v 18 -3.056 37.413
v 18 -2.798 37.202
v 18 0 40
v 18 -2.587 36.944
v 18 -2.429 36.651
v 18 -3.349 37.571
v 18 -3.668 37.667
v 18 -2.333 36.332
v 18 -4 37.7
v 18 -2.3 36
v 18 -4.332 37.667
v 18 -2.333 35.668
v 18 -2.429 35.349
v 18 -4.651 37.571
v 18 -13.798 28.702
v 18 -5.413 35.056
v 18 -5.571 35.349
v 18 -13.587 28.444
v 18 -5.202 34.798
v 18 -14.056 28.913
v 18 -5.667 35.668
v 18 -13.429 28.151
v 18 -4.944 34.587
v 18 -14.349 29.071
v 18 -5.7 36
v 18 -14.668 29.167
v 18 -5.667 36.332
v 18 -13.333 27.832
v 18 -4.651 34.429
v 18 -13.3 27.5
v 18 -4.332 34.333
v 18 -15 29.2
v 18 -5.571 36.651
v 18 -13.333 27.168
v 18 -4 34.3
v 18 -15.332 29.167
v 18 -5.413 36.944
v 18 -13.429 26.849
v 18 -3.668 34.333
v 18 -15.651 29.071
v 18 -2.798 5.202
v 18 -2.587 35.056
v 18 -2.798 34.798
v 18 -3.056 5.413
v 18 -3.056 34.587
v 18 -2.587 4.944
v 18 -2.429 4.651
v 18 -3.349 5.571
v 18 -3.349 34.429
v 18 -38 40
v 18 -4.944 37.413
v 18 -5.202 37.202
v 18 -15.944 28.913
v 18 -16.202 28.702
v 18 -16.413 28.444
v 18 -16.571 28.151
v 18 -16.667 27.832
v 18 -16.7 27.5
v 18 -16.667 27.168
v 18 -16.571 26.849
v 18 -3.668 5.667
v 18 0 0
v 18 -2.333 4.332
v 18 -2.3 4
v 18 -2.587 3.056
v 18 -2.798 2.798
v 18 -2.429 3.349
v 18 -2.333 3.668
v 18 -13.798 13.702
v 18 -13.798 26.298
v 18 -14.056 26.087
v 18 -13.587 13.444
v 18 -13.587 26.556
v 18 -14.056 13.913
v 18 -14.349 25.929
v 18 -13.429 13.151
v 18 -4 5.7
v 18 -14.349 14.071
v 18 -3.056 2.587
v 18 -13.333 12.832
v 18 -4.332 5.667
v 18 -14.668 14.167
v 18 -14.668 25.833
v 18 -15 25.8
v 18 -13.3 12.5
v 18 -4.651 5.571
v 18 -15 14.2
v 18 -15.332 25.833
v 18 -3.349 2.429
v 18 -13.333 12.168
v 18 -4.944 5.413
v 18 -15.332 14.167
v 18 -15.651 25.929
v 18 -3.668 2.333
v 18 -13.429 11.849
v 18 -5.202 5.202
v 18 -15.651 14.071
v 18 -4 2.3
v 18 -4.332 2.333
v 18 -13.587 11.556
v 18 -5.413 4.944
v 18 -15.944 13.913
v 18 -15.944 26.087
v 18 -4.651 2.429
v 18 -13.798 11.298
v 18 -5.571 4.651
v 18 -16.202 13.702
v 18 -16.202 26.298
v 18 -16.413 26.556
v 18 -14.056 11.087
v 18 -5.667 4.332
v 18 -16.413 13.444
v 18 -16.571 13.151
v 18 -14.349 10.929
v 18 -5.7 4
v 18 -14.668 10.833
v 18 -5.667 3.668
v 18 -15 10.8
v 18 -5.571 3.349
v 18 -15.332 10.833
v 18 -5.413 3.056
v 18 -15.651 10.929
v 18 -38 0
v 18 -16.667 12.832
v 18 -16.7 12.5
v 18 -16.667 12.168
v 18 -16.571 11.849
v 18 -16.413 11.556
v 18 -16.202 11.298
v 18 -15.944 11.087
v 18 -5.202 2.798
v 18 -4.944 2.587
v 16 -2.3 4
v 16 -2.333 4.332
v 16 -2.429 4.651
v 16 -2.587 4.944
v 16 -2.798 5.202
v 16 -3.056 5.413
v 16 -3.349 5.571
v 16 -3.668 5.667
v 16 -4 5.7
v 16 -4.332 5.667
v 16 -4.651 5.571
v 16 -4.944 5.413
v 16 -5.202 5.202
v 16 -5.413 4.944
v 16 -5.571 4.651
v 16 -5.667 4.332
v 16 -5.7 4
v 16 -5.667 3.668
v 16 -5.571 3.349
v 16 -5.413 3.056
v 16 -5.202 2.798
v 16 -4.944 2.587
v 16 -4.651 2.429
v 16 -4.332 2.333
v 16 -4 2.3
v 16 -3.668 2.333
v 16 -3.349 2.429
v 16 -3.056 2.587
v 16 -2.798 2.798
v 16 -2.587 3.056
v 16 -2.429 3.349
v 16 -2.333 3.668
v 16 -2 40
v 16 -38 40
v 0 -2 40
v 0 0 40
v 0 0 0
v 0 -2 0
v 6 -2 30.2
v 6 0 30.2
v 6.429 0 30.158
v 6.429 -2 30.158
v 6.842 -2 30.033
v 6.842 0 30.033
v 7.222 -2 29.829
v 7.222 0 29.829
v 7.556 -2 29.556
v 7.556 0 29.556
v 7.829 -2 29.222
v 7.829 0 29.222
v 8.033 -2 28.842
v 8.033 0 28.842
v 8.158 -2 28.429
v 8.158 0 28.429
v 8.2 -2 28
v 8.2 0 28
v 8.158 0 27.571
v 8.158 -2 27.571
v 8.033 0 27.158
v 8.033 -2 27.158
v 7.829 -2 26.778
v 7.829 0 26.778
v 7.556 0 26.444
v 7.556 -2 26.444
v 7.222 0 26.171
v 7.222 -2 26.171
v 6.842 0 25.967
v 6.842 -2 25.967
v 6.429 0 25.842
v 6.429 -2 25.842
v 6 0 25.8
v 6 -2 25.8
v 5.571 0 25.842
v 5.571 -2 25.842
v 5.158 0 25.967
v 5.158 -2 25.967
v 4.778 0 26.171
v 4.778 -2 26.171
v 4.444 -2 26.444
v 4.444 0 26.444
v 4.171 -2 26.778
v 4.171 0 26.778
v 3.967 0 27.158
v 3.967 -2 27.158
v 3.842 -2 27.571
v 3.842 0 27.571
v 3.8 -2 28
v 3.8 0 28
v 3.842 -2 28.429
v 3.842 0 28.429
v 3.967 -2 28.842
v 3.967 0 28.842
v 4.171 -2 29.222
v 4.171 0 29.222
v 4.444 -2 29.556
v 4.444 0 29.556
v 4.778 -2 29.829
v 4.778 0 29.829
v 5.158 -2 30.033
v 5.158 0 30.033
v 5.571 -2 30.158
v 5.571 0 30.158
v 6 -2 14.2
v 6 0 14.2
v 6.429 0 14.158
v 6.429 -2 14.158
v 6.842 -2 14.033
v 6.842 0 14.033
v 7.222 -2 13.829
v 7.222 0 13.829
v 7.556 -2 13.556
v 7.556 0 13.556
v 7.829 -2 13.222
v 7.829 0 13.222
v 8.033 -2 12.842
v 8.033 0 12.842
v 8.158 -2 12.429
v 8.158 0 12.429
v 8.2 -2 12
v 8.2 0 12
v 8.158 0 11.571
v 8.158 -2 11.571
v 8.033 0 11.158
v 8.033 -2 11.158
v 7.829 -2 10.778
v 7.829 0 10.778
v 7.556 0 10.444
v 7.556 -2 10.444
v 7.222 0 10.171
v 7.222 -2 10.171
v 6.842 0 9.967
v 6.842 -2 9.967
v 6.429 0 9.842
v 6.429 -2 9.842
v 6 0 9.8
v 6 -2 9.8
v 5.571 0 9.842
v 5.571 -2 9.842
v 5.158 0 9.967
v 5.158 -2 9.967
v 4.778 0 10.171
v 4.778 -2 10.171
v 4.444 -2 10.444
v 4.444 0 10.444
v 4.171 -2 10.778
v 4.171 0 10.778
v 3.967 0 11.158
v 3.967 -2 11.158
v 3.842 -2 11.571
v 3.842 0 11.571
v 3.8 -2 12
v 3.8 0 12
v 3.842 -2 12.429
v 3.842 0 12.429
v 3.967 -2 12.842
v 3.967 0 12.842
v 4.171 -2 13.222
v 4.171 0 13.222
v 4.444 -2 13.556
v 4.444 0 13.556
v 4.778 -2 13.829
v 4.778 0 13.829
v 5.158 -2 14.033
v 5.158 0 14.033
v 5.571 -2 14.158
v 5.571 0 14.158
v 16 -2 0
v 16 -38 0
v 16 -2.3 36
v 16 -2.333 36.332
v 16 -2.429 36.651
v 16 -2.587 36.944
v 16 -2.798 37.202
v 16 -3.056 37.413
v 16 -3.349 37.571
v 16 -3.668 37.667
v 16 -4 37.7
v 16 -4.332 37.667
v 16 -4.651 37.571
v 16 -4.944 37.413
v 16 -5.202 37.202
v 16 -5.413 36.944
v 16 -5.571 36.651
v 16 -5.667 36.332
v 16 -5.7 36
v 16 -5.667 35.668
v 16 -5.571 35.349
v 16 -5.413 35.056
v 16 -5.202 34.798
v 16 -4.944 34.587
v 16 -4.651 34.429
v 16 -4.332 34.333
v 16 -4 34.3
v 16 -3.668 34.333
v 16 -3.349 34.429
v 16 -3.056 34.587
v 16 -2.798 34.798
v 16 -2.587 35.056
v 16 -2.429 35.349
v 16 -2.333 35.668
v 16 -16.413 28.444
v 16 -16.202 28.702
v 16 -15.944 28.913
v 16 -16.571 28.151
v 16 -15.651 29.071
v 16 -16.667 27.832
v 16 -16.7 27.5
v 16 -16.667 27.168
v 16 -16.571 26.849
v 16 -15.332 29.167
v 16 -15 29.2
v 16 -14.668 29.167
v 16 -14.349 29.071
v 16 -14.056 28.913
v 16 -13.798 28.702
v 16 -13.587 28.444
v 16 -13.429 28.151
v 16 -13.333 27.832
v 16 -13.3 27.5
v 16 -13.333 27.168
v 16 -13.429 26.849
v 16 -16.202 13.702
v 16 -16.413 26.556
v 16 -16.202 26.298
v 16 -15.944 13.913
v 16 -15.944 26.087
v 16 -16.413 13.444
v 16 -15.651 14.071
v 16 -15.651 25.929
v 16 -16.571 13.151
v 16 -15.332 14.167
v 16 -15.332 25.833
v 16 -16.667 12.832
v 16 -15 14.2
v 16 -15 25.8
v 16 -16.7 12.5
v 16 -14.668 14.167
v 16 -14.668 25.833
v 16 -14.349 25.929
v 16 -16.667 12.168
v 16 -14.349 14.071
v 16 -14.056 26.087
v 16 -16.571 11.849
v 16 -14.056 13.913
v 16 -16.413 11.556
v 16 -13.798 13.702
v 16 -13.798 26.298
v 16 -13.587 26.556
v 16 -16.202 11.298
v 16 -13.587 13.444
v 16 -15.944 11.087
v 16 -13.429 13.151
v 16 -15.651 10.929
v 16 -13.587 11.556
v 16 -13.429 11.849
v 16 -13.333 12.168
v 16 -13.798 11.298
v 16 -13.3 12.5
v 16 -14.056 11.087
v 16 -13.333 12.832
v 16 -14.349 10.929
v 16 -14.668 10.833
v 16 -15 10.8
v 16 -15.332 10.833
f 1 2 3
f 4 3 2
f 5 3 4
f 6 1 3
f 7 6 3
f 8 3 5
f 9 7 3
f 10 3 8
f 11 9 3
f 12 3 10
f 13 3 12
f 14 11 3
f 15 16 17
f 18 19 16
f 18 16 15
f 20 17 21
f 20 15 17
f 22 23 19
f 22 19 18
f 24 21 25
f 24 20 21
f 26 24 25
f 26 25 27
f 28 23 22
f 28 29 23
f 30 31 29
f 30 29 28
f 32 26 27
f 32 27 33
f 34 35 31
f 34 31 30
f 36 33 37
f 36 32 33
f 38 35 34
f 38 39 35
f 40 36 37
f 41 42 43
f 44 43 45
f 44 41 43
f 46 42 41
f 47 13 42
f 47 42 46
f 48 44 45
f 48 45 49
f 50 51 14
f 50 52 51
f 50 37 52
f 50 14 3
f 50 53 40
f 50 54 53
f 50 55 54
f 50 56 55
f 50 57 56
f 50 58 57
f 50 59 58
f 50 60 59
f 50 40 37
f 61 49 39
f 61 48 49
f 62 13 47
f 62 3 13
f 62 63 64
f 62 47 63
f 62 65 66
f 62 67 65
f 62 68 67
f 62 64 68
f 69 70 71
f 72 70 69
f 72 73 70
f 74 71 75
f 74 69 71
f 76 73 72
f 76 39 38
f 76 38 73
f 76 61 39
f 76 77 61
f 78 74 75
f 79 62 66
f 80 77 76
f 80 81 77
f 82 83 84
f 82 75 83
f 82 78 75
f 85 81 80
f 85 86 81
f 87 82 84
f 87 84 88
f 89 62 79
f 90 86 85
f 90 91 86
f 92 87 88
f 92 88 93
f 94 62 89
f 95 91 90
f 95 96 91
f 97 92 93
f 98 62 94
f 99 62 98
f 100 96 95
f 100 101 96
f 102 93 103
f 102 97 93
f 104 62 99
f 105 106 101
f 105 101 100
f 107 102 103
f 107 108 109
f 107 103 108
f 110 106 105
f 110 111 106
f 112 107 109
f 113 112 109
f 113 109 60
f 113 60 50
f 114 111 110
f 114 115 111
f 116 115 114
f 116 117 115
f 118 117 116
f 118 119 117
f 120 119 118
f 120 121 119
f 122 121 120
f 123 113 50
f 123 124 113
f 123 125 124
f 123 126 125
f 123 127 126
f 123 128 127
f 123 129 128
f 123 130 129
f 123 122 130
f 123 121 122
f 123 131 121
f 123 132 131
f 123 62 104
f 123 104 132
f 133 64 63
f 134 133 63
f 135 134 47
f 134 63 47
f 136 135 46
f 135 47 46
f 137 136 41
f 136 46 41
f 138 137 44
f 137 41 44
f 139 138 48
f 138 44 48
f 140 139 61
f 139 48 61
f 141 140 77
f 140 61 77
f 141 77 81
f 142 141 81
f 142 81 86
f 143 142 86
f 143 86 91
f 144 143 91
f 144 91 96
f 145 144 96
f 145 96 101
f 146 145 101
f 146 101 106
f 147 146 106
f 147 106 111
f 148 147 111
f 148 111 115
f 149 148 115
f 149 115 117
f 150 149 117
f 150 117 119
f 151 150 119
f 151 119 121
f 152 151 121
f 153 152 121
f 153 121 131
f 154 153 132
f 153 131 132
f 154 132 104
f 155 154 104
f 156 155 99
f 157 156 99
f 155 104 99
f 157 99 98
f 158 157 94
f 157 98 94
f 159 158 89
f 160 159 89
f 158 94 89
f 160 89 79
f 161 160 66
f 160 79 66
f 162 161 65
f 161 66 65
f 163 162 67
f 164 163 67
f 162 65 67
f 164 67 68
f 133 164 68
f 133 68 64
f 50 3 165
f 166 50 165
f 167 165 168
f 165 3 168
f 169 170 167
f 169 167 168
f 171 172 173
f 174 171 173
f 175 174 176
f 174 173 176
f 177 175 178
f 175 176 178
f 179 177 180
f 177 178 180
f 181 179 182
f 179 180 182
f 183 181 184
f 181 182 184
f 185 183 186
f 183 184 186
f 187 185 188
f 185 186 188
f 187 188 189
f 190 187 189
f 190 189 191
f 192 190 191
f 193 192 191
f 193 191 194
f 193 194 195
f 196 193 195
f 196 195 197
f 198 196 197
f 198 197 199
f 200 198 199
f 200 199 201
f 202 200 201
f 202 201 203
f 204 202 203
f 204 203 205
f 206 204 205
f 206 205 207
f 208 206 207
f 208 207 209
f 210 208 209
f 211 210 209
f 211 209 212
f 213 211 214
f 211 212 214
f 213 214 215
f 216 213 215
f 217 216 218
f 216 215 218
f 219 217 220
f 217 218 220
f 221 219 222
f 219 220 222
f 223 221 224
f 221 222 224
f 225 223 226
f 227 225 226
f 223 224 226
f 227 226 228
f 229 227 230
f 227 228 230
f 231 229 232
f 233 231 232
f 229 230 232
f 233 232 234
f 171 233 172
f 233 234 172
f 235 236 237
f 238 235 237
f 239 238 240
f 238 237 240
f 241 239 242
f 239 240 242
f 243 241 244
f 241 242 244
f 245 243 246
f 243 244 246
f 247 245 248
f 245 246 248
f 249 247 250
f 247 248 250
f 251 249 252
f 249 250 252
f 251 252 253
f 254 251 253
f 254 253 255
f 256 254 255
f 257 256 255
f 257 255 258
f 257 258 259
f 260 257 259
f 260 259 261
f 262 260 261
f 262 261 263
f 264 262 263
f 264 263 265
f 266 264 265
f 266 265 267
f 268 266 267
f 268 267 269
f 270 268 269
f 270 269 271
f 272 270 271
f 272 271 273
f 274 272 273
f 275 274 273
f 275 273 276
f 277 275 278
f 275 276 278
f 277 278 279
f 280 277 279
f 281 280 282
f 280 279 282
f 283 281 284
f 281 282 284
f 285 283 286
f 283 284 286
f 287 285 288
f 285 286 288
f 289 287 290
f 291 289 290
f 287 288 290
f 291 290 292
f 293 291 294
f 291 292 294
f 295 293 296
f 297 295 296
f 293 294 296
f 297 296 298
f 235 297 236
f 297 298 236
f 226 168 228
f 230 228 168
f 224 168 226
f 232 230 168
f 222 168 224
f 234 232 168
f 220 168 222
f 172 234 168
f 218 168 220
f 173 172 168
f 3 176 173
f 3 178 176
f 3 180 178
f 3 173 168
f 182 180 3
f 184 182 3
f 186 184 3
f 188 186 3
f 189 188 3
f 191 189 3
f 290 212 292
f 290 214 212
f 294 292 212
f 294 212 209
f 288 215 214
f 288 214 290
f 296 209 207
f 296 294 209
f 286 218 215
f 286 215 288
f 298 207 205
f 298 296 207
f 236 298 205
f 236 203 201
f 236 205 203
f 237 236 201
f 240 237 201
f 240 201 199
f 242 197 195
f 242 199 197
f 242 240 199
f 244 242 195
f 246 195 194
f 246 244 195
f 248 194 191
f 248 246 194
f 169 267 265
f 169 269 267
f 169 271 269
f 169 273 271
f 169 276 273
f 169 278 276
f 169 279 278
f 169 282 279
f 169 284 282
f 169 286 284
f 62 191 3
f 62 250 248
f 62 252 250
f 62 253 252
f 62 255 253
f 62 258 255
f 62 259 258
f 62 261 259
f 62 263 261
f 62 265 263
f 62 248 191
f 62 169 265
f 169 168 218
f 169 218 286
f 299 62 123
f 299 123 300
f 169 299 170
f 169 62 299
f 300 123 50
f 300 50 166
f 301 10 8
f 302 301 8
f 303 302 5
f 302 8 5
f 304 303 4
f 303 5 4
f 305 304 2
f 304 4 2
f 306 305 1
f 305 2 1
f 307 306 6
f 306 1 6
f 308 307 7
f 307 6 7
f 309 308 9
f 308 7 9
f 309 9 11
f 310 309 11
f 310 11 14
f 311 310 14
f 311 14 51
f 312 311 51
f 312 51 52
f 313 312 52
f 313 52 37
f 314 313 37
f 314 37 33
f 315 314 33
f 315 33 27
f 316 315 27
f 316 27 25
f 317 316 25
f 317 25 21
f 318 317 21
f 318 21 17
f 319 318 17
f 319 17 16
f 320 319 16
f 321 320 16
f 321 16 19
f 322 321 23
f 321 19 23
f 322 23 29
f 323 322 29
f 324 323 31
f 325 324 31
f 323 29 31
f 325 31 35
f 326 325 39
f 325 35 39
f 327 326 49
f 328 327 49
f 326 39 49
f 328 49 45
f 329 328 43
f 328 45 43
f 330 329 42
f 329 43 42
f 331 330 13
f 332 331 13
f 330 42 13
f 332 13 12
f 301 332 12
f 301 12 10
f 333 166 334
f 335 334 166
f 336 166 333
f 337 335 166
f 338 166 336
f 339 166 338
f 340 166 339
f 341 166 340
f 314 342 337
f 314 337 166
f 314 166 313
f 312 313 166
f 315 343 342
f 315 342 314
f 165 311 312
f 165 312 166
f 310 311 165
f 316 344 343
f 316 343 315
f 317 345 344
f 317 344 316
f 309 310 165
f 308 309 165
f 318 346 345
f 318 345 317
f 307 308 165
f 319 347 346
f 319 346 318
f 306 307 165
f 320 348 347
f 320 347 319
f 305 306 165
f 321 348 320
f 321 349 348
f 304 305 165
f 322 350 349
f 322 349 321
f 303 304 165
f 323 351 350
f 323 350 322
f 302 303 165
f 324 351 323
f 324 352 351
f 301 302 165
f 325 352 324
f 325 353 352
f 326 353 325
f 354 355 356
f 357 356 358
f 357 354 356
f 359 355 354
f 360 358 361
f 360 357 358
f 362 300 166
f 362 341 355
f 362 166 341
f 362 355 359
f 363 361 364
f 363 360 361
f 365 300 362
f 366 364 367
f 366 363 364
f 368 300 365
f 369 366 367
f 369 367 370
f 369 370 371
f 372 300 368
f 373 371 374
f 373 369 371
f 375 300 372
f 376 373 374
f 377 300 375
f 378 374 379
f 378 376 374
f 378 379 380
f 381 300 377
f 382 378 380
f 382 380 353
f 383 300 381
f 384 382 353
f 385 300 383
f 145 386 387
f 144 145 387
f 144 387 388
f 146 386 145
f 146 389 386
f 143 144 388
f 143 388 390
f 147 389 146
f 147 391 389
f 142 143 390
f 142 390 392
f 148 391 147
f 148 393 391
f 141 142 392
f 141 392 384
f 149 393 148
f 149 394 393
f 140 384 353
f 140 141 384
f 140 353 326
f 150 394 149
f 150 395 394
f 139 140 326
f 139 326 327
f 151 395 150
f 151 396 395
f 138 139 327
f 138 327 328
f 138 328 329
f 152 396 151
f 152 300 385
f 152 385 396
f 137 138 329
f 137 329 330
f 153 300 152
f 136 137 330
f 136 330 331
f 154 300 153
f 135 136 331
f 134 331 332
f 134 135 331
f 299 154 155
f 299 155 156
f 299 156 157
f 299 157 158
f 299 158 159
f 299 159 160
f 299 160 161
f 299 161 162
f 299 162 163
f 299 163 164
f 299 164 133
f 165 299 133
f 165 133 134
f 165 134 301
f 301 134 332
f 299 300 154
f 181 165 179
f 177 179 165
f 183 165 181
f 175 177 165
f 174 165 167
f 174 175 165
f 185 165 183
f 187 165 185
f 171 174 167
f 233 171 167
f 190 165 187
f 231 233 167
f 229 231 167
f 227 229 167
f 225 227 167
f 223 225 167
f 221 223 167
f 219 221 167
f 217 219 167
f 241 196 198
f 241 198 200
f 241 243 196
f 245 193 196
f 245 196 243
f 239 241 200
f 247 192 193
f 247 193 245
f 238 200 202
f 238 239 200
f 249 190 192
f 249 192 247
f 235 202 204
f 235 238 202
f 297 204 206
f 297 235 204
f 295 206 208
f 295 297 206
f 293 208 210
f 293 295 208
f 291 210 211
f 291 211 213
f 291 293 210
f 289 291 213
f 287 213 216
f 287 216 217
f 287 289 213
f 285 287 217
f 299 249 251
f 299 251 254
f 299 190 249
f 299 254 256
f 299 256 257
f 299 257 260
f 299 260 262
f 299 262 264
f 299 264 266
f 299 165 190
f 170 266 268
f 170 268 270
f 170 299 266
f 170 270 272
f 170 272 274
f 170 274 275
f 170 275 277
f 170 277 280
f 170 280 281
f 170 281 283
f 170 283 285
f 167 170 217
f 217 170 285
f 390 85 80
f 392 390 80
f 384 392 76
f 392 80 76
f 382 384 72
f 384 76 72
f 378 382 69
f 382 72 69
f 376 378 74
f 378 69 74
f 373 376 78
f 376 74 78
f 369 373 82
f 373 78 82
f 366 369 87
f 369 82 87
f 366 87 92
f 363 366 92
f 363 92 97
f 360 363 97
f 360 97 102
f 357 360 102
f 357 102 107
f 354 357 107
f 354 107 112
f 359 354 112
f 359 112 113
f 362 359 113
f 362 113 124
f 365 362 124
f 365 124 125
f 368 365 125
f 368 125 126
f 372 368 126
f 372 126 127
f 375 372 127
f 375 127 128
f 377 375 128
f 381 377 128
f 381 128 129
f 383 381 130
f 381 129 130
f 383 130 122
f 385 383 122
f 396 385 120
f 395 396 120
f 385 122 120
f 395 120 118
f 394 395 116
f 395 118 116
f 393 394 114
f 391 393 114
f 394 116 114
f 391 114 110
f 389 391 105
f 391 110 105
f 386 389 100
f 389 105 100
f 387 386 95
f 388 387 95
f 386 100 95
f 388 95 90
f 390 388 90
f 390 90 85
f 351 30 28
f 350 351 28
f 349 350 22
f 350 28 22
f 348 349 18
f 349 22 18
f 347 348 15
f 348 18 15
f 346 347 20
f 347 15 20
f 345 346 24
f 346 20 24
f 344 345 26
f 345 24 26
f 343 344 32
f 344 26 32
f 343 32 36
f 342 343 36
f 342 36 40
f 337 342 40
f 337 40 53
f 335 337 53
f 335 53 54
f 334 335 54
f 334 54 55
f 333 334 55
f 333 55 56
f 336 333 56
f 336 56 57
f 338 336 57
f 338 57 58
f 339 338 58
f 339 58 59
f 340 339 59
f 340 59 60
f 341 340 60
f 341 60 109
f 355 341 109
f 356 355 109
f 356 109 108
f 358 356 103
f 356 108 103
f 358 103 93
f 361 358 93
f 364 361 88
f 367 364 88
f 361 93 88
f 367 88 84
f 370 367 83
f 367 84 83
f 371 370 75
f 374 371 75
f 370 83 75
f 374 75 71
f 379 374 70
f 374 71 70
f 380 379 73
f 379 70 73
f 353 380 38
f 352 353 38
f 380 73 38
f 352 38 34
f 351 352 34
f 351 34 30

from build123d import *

# Parameters (mm, degrees)
EXTRUDE_1_DEPTH     = 40
CUT_EXTRUDE_1_REACH = 60.034
SKETCH_2_R          = 2.2
CUT_EXTRUDE_2_REACH = 60.034
SKETCH_3_R          = 1.7


with BuildPart() as part:
    # 草图1 → 凸台-拉伸1 (new body)
    with BuildSketch(Plane.XY):
        Polygon((0, 0), (18, 0), (18, -38), (16, -38), (16, -2), (0, -2), align=None)
    extrude(amount=EXTRUDE_1_DEPTH)

    # 草图2 → 切除-拉伸1 (cut, up to next)
    with BuildSketch(Plane(origin=(0, 0, 0), x_dir=(1, 0, 0), z_dir=(0, 1, 0)), mode=Mode.PRIVATE) as cut_extrude_1_sk1:
        with Locations(Location((6, -28, 0), (0, 0, 270))):
            Circle(SKETCH_2_R)
    cut_extrude_1_tool1 = extrude(cut_extrude_1_sk1.sketch, amount=-CUT_EXTRUDE_1_REACH, mode=Mode.PRIVATE) & part.part
    # 草图2 → 切除-拉伸1 (cut, up to next)
    with BuildSketch(Plane(origin=(0, 0, 0), x_dir=(1, 0, 0), z_dir=(0, 1, 0)), mode=Mode.PRIVATE) as cut_extrude_1_sk2:
        with Locations(Location((6, -12, 0), (0, 0, 270))):
            Circle(SKETCH_2_R)
    cut_extrude_1_tool2 = extrude(cut_extrude_1_sk2.sketch, amount=-CUT_EXTRUDE_1_REACH, mode=Mode.PRIVATE) & part.part
    add(cut_extrude_1_tool1.solids().sort_by_distance((6, 0, 28))[0], mode=Mode.SUBTRACT)
    add(cut_extrude_1_tool2.solids().sort_by_distance((6, 0, 12))[0], mode=Mode.SUBTRACT)

    # 草图3 → 切除-拉伸2 (cut, up to next)
    with BuildSketch(Plane(origin=(18, 0, 0), x_dir=(0, 0, -1), z_dir=(1, 0, 0)), mode=Mode.PRIVATE) as cut_extrude_2_sk1:
        with Locations(Location((-27.5, -15, 0), (0, 0, 90))):
            Circle(SKETCH_3_R)
    cut_extrude_2_tool1 = extrude(cut_extrude_2_sk1.sketch, amount=-CUT_EXTRUDE_2_REACH, mode=Mode.PRIVATE) & part.part
    # 草图3 → 切除-拉伸2 (cut, up to next)
    with BuildSketch(Plane(origin=(18, 0, 0), x_dir=(0, 0, -1), z_dir=(1, 0, 0)), mode=Mode.PRIVATE) as cut_extrude_2_sk2:
        with Locations(Location((-12.5, -15, 0), (0, 0, 90))):
            Circle(SKETCH_3_R)
    cut_extrude_2_tool2 = extrude(cut_extrude_2_sk2.sketch, amount=-CUT_EXTRUDE_2_REACH, mode=Mode.PRIVATE) & part.part
    # 草图3 → 切除-拉伸2 (cut, up to next)
    with BuildSketch(Plane(origin=(18, 0, 0), x_dir=(0, 0, -1), z_dir=(1, 0, 0)), mode=Mode.PRIVATE) as cut_extrude_2_sk3:
        with Locations(Location((-36, -4, 0), (0, 0, 90))):
            Circle(SKETCH_3_R)
    cut_extrude_2_tool3 = extrude(cut_extrude_2_sk3.sketch, amount=-CUT_EXTRUDE_2_REACH, mode=Mode.PRIVATE) & part.part
    # 草图3 → 切除-拉伸2 (cut, up to next)
    with BuildSketch(Plane(origin=(18, 0, 0), x_dir=(0, 0, -1), z_dir=(1, 0, 0)), mode=Mode.PRIVATE) as cut_extrude_2_sk4:
        with Locations(Location((-4, -4, 0), (0, 0, 90))):
            Circle(SKETCH_3_R)
    cut_extrude_2_tool4 = extrude(cut_extrude_2_sk4.sketch, amount=-CUT_EXTRUDE_2_REACH, mode=Mode.PRIVATE) & part.part
    add(cut_extrude_2_tool1.solids().sort_by_distance((18, -15, 27.5))[0], mode=Mode.SUBTRACT)
    add(cut_extrude_2_tool2.solids().sort_by_distance((18, -15, 12.5))[0], mode=Mode.SUBTRACT)
    add(cut_extrude_2_tool3.solids().sort_by_distance((18, -4, 36))[0], mode=Mode.SUBTRACT)
    add(cut_extrude_2_tool4.solids().sort_by_distance((18, -4, 4))[0], mode=Mode.SUBTRACT)


solid = part.part
